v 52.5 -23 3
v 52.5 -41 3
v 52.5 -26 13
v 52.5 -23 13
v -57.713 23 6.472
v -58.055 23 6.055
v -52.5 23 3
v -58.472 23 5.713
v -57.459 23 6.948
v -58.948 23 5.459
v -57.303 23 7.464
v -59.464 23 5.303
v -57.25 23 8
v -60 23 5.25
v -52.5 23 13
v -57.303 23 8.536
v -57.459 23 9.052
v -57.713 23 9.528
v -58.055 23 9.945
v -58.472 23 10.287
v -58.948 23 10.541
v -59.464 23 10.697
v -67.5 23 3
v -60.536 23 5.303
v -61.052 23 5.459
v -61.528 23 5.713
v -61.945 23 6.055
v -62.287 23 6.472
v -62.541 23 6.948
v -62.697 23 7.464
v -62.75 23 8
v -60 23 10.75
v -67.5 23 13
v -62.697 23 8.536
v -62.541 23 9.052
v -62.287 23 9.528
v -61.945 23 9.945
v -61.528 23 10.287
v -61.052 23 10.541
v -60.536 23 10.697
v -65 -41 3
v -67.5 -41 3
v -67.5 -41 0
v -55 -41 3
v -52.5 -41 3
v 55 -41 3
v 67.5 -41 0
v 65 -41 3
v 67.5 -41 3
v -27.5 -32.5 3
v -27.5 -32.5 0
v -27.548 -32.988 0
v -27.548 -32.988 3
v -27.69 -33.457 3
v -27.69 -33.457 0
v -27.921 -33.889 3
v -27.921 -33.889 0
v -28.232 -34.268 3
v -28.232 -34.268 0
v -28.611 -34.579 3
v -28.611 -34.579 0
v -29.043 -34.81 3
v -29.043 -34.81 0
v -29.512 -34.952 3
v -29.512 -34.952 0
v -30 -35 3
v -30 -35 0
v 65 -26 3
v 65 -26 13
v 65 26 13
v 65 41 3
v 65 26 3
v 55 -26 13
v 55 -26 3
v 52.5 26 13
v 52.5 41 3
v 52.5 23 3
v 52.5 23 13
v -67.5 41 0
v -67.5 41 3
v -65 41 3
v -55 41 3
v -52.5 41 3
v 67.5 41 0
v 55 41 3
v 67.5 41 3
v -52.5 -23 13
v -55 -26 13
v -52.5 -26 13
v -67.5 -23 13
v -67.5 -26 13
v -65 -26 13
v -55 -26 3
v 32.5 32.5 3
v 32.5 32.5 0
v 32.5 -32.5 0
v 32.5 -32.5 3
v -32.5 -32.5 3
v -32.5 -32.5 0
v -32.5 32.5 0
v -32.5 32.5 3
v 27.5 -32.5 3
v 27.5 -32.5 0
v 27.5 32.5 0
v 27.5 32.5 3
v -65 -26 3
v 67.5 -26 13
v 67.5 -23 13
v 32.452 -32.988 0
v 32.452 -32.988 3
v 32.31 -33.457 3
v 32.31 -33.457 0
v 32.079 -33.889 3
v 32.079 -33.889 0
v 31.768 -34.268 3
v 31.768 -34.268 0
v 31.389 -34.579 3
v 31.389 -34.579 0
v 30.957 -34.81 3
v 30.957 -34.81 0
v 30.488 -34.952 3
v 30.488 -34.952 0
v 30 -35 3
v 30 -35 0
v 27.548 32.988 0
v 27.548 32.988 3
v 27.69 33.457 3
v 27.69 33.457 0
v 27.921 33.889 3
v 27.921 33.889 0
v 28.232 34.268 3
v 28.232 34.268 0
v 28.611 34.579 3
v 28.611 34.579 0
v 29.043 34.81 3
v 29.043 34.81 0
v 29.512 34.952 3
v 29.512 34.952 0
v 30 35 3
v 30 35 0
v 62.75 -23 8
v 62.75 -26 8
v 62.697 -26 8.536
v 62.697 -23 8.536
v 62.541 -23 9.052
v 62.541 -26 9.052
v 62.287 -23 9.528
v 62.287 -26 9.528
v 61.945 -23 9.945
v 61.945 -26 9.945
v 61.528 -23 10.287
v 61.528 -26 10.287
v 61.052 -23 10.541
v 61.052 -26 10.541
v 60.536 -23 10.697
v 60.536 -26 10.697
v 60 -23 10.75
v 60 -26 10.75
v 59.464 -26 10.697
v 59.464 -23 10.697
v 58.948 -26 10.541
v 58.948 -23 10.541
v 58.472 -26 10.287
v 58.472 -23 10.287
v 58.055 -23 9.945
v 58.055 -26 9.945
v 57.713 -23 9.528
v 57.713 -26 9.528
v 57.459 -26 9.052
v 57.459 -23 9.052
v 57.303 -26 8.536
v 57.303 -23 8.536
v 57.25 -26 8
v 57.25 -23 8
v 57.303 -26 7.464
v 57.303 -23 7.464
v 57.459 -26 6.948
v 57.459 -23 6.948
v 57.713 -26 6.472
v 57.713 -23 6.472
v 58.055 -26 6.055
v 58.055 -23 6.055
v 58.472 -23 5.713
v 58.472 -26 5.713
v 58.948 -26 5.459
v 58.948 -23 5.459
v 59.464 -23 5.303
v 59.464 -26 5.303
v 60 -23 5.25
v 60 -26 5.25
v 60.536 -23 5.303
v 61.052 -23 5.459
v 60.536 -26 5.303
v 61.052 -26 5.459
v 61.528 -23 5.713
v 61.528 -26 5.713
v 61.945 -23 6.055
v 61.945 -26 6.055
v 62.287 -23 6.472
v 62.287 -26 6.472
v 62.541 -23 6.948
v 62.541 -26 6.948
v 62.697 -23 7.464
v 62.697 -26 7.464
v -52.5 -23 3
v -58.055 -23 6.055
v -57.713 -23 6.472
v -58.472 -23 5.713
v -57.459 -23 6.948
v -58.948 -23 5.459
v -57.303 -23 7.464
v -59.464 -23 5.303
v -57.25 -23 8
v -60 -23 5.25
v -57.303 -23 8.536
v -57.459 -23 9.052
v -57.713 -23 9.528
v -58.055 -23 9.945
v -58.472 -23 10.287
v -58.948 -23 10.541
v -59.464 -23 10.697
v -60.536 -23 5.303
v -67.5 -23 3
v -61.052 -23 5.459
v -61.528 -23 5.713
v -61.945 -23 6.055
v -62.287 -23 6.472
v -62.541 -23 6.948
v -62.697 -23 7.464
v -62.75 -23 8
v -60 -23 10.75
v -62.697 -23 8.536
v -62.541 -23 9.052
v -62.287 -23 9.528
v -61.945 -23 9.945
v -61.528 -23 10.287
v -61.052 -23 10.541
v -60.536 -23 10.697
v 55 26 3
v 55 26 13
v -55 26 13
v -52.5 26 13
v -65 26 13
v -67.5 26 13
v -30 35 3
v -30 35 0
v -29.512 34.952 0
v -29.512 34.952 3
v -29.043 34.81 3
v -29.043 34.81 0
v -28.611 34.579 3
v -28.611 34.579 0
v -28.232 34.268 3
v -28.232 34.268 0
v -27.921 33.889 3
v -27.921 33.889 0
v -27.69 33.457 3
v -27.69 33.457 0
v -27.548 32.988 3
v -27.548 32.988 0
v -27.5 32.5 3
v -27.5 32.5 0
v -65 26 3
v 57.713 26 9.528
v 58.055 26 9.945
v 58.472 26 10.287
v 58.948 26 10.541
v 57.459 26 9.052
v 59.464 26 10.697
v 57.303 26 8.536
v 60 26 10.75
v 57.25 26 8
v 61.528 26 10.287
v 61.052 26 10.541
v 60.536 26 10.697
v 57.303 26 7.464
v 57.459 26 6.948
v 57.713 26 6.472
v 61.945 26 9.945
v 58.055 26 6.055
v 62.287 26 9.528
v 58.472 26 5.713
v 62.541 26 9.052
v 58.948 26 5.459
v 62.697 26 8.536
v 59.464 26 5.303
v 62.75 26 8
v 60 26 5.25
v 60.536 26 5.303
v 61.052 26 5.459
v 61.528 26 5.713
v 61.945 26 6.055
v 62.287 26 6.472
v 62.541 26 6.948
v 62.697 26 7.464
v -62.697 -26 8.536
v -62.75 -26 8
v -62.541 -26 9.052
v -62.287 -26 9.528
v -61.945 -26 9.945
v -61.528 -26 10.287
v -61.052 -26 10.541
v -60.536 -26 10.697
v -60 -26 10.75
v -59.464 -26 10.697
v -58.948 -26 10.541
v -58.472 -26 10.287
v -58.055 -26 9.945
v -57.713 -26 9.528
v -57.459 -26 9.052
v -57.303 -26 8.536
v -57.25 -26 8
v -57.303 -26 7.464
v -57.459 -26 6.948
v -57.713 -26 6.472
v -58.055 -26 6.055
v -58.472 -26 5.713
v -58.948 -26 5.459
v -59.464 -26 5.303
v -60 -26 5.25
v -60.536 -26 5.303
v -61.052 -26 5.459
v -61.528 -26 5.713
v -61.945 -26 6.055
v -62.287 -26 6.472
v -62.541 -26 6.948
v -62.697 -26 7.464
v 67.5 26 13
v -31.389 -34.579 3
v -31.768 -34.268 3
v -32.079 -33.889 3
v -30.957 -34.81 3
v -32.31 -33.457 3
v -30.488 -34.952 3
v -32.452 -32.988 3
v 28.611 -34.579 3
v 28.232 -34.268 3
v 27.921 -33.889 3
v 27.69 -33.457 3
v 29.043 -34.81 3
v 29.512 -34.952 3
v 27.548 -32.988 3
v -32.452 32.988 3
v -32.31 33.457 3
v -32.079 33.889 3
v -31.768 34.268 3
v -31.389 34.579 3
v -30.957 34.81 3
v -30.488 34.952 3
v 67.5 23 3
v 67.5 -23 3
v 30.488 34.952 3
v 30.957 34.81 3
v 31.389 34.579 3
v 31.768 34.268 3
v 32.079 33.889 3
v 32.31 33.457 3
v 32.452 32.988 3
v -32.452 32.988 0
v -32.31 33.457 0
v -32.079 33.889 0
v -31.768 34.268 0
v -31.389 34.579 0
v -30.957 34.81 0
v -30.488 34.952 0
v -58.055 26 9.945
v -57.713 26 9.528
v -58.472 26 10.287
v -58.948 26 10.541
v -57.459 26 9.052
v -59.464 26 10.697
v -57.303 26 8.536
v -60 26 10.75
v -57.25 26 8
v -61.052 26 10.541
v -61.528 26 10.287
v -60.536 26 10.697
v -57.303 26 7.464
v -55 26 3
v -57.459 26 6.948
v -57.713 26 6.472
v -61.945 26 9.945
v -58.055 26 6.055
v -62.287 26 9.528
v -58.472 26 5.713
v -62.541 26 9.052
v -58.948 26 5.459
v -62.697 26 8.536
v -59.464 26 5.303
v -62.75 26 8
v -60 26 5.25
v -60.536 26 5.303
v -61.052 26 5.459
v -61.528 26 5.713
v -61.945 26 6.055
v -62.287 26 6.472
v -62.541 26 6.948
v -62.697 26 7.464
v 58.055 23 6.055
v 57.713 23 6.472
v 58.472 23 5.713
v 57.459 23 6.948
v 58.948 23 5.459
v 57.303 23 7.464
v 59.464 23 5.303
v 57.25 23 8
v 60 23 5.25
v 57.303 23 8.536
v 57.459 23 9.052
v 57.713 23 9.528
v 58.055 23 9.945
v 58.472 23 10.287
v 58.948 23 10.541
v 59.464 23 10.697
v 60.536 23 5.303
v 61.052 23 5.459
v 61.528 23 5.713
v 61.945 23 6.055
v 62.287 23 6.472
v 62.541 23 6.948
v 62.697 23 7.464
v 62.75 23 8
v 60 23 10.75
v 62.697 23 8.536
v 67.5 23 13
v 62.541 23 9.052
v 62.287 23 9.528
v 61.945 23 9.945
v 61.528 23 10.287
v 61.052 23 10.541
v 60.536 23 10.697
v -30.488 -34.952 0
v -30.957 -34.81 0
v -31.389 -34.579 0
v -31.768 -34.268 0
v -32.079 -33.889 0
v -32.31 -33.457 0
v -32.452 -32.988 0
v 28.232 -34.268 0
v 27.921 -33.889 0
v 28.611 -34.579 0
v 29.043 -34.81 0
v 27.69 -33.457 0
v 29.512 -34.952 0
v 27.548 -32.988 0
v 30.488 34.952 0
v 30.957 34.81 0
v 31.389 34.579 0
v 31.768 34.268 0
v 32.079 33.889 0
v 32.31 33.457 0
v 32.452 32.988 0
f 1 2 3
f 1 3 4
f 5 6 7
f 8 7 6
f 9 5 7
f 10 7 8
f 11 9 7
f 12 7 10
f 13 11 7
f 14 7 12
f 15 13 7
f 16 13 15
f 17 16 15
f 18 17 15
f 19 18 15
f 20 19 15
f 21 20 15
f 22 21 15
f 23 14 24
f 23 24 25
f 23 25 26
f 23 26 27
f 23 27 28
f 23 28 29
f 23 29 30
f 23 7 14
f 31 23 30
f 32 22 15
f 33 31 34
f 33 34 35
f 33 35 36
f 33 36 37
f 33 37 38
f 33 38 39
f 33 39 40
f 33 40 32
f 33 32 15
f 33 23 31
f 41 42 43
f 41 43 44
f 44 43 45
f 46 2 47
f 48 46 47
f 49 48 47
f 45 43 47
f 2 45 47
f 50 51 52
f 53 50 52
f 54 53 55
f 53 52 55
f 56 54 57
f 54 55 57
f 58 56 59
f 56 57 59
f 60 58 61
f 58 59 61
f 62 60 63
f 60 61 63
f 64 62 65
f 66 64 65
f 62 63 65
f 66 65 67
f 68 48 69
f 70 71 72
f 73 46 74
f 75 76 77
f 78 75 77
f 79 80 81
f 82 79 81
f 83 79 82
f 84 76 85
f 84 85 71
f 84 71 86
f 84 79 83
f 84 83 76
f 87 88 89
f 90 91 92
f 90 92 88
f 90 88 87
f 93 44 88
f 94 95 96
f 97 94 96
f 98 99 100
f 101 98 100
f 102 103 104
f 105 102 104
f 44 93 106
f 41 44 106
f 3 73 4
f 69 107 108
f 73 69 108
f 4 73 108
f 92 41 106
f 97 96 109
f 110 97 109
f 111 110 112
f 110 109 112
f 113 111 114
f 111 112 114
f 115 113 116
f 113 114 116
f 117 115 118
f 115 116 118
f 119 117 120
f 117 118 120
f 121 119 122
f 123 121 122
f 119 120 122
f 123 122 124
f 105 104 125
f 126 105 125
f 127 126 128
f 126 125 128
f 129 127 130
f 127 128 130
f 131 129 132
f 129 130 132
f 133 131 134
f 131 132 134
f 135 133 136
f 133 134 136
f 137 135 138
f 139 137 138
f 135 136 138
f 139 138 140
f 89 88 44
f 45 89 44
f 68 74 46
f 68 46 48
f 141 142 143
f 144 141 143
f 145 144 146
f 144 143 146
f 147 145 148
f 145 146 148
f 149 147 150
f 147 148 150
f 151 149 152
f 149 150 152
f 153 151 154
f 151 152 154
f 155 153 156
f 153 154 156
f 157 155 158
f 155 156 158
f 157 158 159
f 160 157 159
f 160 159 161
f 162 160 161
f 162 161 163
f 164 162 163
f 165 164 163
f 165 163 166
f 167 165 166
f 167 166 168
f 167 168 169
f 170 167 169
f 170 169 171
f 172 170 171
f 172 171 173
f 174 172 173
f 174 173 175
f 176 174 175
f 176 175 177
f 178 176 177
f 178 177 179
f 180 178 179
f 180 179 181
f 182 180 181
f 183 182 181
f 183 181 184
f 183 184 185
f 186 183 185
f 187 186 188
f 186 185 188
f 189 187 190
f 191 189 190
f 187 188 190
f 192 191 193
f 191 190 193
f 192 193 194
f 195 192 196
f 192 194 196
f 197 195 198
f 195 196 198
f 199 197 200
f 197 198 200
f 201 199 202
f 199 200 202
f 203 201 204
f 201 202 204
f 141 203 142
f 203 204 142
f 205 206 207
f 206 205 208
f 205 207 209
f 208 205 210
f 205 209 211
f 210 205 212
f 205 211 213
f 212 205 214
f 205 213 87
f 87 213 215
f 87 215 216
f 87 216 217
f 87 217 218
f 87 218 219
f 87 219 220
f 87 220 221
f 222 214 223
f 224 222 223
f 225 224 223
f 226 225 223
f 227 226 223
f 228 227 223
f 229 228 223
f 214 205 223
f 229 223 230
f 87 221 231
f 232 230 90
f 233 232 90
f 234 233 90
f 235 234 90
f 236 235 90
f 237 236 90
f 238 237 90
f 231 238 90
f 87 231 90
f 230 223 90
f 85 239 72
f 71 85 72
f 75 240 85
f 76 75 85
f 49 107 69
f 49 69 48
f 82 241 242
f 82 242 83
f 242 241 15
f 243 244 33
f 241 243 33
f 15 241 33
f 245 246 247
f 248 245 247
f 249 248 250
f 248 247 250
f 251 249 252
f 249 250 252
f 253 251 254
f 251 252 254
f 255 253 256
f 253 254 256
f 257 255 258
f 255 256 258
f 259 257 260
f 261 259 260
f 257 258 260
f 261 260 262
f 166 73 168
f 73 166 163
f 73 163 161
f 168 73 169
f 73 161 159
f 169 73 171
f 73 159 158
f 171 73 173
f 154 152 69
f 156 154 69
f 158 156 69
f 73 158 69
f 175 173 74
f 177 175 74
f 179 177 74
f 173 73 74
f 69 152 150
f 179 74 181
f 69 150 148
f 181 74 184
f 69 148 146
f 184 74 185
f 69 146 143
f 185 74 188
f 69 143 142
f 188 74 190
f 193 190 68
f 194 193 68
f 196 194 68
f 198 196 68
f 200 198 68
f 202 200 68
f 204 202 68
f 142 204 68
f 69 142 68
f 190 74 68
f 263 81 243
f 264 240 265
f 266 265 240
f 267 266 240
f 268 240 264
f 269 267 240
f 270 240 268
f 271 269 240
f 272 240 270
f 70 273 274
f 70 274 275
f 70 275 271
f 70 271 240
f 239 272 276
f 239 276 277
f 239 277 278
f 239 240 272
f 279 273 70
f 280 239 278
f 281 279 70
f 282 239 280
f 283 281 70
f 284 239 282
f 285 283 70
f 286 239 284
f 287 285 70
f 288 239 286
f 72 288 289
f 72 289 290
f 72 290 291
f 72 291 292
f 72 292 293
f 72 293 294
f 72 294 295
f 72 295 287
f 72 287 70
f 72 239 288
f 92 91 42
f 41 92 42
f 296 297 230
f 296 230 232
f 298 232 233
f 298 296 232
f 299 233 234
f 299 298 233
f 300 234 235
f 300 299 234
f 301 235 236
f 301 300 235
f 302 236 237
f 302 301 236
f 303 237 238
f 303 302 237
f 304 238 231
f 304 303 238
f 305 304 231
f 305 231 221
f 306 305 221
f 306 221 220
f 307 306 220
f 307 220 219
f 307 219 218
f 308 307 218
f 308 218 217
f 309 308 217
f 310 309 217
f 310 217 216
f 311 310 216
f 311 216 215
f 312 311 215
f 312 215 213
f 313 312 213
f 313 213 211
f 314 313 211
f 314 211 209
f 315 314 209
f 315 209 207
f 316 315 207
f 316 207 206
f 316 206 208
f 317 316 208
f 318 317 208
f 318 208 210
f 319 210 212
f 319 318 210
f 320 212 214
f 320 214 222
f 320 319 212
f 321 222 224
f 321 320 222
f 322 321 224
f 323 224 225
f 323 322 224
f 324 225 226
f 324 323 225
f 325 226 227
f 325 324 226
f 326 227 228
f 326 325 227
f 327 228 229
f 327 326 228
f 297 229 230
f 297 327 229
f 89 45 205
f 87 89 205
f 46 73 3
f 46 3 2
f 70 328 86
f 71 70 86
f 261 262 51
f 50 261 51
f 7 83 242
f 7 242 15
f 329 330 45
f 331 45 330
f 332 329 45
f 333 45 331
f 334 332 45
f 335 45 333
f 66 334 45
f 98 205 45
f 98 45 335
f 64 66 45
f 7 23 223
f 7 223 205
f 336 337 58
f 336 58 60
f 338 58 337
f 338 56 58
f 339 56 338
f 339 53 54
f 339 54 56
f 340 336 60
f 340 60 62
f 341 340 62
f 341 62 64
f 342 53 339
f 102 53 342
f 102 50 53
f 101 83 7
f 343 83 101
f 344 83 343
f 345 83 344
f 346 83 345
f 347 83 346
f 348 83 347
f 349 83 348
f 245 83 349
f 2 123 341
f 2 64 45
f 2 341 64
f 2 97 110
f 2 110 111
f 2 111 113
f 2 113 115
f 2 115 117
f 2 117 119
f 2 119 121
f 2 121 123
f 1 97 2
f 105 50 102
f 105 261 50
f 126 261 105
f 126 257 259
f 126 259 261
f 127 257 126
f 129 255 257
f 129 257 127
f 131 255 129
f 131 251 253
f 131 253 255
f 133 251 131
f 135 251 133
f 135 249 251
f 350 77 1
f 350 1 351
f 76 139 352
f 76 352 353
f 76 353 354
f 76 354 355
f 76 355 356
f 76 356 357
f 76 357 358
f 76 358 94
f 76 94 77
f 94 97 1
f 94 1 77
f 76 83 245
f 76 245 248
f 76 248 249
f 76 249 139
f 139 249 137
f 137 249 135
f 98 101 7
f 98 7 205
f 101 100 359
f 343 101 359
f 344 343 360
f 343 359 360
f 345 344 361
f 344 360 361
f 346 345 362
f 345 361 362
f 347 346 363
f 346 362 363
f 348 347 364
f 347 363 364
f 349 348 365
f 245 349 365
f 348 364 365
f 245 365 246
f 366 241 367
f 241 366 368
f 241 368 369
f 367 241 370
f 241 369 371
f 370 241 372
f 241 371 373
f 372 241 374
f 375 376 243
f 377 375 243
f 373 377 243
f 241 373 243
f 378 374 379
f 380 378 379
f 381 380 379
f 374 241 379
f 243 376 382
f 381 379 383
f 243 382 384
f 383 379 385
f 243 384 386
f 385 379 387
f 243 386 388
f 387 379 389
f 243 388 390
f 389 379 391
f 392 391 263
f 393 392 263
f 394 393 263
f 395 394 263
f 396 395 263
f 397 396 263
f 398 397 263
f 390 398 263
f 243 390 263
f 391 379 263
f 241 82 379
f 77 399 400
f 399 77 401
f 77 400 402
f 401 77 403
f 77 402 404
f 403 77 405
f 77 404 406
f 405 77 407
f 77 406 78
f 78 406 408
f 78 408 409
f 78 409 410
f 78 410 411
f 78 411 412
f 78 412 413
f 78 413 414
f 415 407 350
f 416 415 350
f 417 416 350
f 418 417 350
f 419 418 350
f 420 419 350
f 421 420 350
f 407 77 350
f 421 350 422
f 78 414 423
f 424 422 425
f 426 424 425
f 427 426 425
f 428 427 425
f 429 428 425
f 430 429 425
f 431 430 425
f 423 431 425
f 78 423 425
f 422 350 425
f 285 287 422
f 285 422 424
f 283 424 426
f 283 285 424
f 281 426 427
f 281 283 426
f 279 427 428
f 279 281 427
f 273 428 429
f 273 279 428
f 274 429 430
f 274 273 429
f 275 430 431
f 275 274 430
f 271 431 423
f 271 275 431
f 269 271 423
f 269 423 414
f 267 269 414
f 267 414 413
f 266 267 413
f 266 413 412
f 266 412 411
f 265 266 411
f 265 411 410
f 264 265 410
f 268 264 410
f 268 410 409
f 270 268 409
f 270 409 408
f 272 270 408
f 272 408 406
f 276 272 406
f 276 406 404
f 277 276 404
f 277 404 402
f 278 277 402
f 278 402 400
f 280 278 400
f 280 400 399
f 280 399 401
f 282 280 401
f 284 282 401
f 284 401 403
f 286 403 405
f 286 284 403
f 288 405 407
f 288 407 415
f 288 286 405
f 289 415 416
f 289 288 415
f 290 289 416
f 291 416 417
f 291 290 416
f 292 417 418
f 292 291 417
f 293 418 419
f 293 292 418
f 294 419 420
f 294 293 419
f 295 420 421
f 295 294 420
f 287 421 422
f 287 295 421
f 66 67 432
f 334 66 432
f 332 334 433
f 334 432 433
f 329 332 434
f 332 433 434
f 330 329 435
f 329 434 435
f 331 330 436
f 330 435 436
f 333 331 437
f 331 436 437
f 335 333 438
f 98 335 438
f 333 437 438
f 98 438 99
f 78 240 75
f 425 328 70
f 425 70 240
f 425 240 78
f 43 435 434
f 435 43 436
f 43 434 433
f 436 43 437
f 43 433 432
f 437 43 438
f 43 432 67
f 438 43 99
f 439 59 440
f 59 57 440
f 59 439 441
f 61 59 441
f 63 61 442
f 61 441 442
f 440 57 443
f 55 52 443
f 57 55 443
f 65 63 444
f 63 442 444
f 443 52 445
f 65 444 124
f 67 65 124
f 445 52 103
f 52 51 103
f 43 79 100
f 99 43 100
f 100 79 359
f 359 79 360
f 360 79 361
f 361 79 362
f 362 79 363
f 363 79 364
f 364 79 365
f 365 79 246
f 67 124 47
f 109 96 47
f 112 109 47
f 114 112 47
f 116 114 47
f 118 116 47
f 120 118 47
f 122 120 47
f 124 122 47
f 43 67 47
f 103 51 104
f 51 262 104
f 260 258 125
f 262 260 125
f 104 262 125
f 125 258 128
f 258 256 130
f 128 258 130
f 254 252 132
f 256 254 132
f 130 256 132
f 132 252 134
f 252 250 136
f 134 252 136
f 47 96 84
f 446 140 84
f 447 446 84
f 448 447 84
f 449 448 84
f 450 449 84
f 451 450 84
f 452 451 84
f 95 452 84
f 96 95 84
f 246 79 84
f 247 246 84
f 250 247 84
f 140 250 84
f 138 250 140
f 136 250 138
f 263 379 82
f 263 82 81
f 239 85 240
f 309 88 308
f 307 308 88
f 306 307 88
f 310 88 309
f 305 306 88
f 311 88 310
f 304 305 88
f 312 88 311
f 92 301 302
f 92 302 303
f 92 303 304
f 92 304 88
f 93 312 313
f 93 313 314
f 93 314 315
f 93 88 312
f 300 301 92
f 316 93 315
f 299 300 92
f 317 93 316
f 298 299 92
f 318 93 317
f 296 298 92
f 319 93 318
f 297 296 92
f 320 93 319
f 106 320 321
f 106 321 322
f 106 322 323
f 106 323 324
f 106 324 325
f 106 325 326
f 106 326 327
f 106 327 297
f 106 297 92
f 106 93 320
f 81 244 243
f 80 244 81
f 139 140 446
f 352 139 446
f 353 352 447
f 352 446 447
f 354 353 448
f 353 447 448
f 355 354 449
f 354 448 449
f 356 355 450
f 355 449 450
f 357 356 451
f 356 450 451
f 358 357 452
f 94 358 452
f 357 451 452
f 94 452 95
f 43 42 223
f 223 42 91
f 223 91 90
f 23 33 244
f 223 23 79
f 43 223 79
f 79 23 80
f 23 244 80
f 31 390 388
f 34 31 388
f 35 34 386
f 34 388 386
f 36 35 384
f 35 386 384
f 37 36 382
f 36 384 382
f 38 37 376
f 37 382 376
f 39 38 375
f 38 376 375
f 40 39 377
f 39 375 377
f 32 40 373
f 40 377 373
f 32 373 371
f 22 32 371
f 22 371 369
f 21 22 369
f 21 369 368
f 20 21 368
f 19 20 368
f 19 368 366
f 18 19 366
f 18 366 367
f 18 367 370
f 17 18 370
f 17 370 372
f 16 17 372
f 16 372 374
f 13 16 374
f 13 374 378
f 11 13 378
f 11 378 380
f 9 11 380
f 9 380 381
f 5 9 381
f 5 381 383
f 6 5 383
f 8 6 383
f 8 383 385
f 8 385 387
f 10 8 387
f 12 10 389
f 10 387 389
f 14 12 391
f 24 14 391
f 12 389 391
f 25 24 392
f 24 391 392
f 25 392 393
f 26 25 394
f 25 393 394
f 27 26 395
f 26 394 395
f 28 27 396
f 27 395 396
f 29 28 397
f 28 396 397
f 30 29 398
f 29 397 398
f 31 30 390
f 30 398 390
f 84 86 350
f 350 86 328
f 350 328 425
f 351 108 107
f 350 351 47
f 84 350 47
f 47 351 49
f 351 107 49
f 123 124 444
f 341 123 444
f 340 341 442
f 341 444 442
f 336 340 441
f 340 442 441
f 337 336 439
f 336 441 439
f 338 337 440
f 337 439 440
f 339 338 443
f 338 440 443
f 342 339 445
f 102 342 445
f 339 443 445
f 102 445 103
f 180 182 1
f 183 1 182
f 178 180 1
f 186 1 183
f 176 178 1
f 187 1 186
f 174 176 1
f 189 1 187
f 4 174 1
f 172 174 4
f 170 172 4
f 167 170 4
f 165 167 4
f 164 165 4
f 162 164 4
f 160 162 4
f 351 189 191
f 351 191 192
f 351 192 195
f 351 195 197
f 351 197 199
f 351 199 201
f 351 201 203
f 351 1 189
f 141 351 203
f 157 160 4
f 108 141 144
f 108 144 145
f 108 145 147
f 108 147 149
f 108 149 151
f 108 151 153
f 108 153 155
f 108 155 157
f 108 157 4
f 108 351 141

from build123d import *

# Parameters (mm, degrees)
F0_W      = 135
F0_H      = 82
F1_DEPTH  = 3
F2_W      = 3
F2_H      = 10
F3_DEPTH  = 15
F4_DEPTH  = 15
F5_W      = 10
F5_H      = 15
F6_DEPTH  = 25
F8_D      = 5.5
F8_DEPTH  = 10
F8_TIP    = 1.6523667023
F12_COUNT = 2


# Not quite as in the source:
# - a feature names something its author has since deleted; it is built from what else it names


with BuildPart() as f1:
    # F0 (on Top) → F1 (new body)
    with BuildSketch(Plane.XY):
        Rectangle(F0_W, F0_H)
        with BuildLine():
            Line((-32.5, -32.5), (-32.5, 32.5))
            ThreePointArc((-32.5, 32.5), (-31.767766953, 34.267766953), (-30, 35))
            ThreePointArc((-30, 35), (-28.232233047, 34.267766953), (-27.5, 32.5))
            Line((-27.5, 32.5), (-27.5, -32.5))
            ThreePointArc((-27.5, -32.5), (-28.232233047, -34.267766953), (-30, -35))
            ThreePointArc((-30, -35), (-31.767766953, -34.267766953), (-32.5, -32.5))
        make_face(mode=Mode.SUBTRACT)
        with BuildLine():
            Line((27.5, -32.5), (27.5, 32.5))
            ThreePointArc((27.5, 32.5), (28.232233047, 34.267766953), (30, 35))
            ThreePointArc((30, 35), (31.767766953, 34.267766953), (32.5, 32.5))
            Line((32.5, 32.5), (32.5, -32.5))
            ThreePointArc((32.5, -32.5), (31.767766953, -34.267766953), (30, -35))
            ThreePointArc((30, -35), (28.232233047, -34.267766953), (27.5, -32.5))
        make_face(mode=Mode.SUBTRACT)
    extrude(amount=F1_DEPTH)

    # F2 (on face) → F3 (join)
    with BuildSketch(Plane.YZ.offset(67.5)):
        with Locations((-24.5, 8)):
            Rectangle(F2_W, F2_H)
    extrude(amount=-F3_DEPTH)

    # F2 (on face) → F4 (join)
    with BuildSketch(Plane.YZ.offset(67.5)):
        Polygon((-41, 3), (-26, 3), (-26, 13), align=None)
    extrude(amount=-F4_DEPTH)

    # F5 (on face) → F6 (cut)
    with BuildSketch(Plane.XY.offset(3)):
        with Locations((60, -33.5)):
            Rectangle(F5_W, F5_H)
    extrude(amount=F6_DEPTH, mode=Mode.SUBTRACT)

    # F8
    with Locations(Plane(origin=(0, -23, 0), x_dir=(-1, 0, 0), z_dir=(0, 1, 0))):
        with Locations((-60, 8)):
            Hole(F8_D / 2, depth=F8_DEPTH)
            with Locations((0, 0, -(F8_DEPTH + F8_TIP / 2))):  # 118° drill point
                Cone(0, F8_D / 2, F8_TIP, mode=Mode.SUBTRACT)

    # F10: F1 across plane


with BuildPart() as f1_1:
    add(f1.part)
    add(f1.part.mirror(Plane.YZ))

    # F12: F1 ×2 about axis
    f12_axis = Axis((0, 0, 10.3634241968), (0, 0, -1))


with BuildPart() as f1_2:
    add(f1_1.part)
    for i in range(1, F12_COUNT):
        add(f1_1.part.rotate(f12_axis, i * 360 / F12_COUNT))


solid = f1_2.part
